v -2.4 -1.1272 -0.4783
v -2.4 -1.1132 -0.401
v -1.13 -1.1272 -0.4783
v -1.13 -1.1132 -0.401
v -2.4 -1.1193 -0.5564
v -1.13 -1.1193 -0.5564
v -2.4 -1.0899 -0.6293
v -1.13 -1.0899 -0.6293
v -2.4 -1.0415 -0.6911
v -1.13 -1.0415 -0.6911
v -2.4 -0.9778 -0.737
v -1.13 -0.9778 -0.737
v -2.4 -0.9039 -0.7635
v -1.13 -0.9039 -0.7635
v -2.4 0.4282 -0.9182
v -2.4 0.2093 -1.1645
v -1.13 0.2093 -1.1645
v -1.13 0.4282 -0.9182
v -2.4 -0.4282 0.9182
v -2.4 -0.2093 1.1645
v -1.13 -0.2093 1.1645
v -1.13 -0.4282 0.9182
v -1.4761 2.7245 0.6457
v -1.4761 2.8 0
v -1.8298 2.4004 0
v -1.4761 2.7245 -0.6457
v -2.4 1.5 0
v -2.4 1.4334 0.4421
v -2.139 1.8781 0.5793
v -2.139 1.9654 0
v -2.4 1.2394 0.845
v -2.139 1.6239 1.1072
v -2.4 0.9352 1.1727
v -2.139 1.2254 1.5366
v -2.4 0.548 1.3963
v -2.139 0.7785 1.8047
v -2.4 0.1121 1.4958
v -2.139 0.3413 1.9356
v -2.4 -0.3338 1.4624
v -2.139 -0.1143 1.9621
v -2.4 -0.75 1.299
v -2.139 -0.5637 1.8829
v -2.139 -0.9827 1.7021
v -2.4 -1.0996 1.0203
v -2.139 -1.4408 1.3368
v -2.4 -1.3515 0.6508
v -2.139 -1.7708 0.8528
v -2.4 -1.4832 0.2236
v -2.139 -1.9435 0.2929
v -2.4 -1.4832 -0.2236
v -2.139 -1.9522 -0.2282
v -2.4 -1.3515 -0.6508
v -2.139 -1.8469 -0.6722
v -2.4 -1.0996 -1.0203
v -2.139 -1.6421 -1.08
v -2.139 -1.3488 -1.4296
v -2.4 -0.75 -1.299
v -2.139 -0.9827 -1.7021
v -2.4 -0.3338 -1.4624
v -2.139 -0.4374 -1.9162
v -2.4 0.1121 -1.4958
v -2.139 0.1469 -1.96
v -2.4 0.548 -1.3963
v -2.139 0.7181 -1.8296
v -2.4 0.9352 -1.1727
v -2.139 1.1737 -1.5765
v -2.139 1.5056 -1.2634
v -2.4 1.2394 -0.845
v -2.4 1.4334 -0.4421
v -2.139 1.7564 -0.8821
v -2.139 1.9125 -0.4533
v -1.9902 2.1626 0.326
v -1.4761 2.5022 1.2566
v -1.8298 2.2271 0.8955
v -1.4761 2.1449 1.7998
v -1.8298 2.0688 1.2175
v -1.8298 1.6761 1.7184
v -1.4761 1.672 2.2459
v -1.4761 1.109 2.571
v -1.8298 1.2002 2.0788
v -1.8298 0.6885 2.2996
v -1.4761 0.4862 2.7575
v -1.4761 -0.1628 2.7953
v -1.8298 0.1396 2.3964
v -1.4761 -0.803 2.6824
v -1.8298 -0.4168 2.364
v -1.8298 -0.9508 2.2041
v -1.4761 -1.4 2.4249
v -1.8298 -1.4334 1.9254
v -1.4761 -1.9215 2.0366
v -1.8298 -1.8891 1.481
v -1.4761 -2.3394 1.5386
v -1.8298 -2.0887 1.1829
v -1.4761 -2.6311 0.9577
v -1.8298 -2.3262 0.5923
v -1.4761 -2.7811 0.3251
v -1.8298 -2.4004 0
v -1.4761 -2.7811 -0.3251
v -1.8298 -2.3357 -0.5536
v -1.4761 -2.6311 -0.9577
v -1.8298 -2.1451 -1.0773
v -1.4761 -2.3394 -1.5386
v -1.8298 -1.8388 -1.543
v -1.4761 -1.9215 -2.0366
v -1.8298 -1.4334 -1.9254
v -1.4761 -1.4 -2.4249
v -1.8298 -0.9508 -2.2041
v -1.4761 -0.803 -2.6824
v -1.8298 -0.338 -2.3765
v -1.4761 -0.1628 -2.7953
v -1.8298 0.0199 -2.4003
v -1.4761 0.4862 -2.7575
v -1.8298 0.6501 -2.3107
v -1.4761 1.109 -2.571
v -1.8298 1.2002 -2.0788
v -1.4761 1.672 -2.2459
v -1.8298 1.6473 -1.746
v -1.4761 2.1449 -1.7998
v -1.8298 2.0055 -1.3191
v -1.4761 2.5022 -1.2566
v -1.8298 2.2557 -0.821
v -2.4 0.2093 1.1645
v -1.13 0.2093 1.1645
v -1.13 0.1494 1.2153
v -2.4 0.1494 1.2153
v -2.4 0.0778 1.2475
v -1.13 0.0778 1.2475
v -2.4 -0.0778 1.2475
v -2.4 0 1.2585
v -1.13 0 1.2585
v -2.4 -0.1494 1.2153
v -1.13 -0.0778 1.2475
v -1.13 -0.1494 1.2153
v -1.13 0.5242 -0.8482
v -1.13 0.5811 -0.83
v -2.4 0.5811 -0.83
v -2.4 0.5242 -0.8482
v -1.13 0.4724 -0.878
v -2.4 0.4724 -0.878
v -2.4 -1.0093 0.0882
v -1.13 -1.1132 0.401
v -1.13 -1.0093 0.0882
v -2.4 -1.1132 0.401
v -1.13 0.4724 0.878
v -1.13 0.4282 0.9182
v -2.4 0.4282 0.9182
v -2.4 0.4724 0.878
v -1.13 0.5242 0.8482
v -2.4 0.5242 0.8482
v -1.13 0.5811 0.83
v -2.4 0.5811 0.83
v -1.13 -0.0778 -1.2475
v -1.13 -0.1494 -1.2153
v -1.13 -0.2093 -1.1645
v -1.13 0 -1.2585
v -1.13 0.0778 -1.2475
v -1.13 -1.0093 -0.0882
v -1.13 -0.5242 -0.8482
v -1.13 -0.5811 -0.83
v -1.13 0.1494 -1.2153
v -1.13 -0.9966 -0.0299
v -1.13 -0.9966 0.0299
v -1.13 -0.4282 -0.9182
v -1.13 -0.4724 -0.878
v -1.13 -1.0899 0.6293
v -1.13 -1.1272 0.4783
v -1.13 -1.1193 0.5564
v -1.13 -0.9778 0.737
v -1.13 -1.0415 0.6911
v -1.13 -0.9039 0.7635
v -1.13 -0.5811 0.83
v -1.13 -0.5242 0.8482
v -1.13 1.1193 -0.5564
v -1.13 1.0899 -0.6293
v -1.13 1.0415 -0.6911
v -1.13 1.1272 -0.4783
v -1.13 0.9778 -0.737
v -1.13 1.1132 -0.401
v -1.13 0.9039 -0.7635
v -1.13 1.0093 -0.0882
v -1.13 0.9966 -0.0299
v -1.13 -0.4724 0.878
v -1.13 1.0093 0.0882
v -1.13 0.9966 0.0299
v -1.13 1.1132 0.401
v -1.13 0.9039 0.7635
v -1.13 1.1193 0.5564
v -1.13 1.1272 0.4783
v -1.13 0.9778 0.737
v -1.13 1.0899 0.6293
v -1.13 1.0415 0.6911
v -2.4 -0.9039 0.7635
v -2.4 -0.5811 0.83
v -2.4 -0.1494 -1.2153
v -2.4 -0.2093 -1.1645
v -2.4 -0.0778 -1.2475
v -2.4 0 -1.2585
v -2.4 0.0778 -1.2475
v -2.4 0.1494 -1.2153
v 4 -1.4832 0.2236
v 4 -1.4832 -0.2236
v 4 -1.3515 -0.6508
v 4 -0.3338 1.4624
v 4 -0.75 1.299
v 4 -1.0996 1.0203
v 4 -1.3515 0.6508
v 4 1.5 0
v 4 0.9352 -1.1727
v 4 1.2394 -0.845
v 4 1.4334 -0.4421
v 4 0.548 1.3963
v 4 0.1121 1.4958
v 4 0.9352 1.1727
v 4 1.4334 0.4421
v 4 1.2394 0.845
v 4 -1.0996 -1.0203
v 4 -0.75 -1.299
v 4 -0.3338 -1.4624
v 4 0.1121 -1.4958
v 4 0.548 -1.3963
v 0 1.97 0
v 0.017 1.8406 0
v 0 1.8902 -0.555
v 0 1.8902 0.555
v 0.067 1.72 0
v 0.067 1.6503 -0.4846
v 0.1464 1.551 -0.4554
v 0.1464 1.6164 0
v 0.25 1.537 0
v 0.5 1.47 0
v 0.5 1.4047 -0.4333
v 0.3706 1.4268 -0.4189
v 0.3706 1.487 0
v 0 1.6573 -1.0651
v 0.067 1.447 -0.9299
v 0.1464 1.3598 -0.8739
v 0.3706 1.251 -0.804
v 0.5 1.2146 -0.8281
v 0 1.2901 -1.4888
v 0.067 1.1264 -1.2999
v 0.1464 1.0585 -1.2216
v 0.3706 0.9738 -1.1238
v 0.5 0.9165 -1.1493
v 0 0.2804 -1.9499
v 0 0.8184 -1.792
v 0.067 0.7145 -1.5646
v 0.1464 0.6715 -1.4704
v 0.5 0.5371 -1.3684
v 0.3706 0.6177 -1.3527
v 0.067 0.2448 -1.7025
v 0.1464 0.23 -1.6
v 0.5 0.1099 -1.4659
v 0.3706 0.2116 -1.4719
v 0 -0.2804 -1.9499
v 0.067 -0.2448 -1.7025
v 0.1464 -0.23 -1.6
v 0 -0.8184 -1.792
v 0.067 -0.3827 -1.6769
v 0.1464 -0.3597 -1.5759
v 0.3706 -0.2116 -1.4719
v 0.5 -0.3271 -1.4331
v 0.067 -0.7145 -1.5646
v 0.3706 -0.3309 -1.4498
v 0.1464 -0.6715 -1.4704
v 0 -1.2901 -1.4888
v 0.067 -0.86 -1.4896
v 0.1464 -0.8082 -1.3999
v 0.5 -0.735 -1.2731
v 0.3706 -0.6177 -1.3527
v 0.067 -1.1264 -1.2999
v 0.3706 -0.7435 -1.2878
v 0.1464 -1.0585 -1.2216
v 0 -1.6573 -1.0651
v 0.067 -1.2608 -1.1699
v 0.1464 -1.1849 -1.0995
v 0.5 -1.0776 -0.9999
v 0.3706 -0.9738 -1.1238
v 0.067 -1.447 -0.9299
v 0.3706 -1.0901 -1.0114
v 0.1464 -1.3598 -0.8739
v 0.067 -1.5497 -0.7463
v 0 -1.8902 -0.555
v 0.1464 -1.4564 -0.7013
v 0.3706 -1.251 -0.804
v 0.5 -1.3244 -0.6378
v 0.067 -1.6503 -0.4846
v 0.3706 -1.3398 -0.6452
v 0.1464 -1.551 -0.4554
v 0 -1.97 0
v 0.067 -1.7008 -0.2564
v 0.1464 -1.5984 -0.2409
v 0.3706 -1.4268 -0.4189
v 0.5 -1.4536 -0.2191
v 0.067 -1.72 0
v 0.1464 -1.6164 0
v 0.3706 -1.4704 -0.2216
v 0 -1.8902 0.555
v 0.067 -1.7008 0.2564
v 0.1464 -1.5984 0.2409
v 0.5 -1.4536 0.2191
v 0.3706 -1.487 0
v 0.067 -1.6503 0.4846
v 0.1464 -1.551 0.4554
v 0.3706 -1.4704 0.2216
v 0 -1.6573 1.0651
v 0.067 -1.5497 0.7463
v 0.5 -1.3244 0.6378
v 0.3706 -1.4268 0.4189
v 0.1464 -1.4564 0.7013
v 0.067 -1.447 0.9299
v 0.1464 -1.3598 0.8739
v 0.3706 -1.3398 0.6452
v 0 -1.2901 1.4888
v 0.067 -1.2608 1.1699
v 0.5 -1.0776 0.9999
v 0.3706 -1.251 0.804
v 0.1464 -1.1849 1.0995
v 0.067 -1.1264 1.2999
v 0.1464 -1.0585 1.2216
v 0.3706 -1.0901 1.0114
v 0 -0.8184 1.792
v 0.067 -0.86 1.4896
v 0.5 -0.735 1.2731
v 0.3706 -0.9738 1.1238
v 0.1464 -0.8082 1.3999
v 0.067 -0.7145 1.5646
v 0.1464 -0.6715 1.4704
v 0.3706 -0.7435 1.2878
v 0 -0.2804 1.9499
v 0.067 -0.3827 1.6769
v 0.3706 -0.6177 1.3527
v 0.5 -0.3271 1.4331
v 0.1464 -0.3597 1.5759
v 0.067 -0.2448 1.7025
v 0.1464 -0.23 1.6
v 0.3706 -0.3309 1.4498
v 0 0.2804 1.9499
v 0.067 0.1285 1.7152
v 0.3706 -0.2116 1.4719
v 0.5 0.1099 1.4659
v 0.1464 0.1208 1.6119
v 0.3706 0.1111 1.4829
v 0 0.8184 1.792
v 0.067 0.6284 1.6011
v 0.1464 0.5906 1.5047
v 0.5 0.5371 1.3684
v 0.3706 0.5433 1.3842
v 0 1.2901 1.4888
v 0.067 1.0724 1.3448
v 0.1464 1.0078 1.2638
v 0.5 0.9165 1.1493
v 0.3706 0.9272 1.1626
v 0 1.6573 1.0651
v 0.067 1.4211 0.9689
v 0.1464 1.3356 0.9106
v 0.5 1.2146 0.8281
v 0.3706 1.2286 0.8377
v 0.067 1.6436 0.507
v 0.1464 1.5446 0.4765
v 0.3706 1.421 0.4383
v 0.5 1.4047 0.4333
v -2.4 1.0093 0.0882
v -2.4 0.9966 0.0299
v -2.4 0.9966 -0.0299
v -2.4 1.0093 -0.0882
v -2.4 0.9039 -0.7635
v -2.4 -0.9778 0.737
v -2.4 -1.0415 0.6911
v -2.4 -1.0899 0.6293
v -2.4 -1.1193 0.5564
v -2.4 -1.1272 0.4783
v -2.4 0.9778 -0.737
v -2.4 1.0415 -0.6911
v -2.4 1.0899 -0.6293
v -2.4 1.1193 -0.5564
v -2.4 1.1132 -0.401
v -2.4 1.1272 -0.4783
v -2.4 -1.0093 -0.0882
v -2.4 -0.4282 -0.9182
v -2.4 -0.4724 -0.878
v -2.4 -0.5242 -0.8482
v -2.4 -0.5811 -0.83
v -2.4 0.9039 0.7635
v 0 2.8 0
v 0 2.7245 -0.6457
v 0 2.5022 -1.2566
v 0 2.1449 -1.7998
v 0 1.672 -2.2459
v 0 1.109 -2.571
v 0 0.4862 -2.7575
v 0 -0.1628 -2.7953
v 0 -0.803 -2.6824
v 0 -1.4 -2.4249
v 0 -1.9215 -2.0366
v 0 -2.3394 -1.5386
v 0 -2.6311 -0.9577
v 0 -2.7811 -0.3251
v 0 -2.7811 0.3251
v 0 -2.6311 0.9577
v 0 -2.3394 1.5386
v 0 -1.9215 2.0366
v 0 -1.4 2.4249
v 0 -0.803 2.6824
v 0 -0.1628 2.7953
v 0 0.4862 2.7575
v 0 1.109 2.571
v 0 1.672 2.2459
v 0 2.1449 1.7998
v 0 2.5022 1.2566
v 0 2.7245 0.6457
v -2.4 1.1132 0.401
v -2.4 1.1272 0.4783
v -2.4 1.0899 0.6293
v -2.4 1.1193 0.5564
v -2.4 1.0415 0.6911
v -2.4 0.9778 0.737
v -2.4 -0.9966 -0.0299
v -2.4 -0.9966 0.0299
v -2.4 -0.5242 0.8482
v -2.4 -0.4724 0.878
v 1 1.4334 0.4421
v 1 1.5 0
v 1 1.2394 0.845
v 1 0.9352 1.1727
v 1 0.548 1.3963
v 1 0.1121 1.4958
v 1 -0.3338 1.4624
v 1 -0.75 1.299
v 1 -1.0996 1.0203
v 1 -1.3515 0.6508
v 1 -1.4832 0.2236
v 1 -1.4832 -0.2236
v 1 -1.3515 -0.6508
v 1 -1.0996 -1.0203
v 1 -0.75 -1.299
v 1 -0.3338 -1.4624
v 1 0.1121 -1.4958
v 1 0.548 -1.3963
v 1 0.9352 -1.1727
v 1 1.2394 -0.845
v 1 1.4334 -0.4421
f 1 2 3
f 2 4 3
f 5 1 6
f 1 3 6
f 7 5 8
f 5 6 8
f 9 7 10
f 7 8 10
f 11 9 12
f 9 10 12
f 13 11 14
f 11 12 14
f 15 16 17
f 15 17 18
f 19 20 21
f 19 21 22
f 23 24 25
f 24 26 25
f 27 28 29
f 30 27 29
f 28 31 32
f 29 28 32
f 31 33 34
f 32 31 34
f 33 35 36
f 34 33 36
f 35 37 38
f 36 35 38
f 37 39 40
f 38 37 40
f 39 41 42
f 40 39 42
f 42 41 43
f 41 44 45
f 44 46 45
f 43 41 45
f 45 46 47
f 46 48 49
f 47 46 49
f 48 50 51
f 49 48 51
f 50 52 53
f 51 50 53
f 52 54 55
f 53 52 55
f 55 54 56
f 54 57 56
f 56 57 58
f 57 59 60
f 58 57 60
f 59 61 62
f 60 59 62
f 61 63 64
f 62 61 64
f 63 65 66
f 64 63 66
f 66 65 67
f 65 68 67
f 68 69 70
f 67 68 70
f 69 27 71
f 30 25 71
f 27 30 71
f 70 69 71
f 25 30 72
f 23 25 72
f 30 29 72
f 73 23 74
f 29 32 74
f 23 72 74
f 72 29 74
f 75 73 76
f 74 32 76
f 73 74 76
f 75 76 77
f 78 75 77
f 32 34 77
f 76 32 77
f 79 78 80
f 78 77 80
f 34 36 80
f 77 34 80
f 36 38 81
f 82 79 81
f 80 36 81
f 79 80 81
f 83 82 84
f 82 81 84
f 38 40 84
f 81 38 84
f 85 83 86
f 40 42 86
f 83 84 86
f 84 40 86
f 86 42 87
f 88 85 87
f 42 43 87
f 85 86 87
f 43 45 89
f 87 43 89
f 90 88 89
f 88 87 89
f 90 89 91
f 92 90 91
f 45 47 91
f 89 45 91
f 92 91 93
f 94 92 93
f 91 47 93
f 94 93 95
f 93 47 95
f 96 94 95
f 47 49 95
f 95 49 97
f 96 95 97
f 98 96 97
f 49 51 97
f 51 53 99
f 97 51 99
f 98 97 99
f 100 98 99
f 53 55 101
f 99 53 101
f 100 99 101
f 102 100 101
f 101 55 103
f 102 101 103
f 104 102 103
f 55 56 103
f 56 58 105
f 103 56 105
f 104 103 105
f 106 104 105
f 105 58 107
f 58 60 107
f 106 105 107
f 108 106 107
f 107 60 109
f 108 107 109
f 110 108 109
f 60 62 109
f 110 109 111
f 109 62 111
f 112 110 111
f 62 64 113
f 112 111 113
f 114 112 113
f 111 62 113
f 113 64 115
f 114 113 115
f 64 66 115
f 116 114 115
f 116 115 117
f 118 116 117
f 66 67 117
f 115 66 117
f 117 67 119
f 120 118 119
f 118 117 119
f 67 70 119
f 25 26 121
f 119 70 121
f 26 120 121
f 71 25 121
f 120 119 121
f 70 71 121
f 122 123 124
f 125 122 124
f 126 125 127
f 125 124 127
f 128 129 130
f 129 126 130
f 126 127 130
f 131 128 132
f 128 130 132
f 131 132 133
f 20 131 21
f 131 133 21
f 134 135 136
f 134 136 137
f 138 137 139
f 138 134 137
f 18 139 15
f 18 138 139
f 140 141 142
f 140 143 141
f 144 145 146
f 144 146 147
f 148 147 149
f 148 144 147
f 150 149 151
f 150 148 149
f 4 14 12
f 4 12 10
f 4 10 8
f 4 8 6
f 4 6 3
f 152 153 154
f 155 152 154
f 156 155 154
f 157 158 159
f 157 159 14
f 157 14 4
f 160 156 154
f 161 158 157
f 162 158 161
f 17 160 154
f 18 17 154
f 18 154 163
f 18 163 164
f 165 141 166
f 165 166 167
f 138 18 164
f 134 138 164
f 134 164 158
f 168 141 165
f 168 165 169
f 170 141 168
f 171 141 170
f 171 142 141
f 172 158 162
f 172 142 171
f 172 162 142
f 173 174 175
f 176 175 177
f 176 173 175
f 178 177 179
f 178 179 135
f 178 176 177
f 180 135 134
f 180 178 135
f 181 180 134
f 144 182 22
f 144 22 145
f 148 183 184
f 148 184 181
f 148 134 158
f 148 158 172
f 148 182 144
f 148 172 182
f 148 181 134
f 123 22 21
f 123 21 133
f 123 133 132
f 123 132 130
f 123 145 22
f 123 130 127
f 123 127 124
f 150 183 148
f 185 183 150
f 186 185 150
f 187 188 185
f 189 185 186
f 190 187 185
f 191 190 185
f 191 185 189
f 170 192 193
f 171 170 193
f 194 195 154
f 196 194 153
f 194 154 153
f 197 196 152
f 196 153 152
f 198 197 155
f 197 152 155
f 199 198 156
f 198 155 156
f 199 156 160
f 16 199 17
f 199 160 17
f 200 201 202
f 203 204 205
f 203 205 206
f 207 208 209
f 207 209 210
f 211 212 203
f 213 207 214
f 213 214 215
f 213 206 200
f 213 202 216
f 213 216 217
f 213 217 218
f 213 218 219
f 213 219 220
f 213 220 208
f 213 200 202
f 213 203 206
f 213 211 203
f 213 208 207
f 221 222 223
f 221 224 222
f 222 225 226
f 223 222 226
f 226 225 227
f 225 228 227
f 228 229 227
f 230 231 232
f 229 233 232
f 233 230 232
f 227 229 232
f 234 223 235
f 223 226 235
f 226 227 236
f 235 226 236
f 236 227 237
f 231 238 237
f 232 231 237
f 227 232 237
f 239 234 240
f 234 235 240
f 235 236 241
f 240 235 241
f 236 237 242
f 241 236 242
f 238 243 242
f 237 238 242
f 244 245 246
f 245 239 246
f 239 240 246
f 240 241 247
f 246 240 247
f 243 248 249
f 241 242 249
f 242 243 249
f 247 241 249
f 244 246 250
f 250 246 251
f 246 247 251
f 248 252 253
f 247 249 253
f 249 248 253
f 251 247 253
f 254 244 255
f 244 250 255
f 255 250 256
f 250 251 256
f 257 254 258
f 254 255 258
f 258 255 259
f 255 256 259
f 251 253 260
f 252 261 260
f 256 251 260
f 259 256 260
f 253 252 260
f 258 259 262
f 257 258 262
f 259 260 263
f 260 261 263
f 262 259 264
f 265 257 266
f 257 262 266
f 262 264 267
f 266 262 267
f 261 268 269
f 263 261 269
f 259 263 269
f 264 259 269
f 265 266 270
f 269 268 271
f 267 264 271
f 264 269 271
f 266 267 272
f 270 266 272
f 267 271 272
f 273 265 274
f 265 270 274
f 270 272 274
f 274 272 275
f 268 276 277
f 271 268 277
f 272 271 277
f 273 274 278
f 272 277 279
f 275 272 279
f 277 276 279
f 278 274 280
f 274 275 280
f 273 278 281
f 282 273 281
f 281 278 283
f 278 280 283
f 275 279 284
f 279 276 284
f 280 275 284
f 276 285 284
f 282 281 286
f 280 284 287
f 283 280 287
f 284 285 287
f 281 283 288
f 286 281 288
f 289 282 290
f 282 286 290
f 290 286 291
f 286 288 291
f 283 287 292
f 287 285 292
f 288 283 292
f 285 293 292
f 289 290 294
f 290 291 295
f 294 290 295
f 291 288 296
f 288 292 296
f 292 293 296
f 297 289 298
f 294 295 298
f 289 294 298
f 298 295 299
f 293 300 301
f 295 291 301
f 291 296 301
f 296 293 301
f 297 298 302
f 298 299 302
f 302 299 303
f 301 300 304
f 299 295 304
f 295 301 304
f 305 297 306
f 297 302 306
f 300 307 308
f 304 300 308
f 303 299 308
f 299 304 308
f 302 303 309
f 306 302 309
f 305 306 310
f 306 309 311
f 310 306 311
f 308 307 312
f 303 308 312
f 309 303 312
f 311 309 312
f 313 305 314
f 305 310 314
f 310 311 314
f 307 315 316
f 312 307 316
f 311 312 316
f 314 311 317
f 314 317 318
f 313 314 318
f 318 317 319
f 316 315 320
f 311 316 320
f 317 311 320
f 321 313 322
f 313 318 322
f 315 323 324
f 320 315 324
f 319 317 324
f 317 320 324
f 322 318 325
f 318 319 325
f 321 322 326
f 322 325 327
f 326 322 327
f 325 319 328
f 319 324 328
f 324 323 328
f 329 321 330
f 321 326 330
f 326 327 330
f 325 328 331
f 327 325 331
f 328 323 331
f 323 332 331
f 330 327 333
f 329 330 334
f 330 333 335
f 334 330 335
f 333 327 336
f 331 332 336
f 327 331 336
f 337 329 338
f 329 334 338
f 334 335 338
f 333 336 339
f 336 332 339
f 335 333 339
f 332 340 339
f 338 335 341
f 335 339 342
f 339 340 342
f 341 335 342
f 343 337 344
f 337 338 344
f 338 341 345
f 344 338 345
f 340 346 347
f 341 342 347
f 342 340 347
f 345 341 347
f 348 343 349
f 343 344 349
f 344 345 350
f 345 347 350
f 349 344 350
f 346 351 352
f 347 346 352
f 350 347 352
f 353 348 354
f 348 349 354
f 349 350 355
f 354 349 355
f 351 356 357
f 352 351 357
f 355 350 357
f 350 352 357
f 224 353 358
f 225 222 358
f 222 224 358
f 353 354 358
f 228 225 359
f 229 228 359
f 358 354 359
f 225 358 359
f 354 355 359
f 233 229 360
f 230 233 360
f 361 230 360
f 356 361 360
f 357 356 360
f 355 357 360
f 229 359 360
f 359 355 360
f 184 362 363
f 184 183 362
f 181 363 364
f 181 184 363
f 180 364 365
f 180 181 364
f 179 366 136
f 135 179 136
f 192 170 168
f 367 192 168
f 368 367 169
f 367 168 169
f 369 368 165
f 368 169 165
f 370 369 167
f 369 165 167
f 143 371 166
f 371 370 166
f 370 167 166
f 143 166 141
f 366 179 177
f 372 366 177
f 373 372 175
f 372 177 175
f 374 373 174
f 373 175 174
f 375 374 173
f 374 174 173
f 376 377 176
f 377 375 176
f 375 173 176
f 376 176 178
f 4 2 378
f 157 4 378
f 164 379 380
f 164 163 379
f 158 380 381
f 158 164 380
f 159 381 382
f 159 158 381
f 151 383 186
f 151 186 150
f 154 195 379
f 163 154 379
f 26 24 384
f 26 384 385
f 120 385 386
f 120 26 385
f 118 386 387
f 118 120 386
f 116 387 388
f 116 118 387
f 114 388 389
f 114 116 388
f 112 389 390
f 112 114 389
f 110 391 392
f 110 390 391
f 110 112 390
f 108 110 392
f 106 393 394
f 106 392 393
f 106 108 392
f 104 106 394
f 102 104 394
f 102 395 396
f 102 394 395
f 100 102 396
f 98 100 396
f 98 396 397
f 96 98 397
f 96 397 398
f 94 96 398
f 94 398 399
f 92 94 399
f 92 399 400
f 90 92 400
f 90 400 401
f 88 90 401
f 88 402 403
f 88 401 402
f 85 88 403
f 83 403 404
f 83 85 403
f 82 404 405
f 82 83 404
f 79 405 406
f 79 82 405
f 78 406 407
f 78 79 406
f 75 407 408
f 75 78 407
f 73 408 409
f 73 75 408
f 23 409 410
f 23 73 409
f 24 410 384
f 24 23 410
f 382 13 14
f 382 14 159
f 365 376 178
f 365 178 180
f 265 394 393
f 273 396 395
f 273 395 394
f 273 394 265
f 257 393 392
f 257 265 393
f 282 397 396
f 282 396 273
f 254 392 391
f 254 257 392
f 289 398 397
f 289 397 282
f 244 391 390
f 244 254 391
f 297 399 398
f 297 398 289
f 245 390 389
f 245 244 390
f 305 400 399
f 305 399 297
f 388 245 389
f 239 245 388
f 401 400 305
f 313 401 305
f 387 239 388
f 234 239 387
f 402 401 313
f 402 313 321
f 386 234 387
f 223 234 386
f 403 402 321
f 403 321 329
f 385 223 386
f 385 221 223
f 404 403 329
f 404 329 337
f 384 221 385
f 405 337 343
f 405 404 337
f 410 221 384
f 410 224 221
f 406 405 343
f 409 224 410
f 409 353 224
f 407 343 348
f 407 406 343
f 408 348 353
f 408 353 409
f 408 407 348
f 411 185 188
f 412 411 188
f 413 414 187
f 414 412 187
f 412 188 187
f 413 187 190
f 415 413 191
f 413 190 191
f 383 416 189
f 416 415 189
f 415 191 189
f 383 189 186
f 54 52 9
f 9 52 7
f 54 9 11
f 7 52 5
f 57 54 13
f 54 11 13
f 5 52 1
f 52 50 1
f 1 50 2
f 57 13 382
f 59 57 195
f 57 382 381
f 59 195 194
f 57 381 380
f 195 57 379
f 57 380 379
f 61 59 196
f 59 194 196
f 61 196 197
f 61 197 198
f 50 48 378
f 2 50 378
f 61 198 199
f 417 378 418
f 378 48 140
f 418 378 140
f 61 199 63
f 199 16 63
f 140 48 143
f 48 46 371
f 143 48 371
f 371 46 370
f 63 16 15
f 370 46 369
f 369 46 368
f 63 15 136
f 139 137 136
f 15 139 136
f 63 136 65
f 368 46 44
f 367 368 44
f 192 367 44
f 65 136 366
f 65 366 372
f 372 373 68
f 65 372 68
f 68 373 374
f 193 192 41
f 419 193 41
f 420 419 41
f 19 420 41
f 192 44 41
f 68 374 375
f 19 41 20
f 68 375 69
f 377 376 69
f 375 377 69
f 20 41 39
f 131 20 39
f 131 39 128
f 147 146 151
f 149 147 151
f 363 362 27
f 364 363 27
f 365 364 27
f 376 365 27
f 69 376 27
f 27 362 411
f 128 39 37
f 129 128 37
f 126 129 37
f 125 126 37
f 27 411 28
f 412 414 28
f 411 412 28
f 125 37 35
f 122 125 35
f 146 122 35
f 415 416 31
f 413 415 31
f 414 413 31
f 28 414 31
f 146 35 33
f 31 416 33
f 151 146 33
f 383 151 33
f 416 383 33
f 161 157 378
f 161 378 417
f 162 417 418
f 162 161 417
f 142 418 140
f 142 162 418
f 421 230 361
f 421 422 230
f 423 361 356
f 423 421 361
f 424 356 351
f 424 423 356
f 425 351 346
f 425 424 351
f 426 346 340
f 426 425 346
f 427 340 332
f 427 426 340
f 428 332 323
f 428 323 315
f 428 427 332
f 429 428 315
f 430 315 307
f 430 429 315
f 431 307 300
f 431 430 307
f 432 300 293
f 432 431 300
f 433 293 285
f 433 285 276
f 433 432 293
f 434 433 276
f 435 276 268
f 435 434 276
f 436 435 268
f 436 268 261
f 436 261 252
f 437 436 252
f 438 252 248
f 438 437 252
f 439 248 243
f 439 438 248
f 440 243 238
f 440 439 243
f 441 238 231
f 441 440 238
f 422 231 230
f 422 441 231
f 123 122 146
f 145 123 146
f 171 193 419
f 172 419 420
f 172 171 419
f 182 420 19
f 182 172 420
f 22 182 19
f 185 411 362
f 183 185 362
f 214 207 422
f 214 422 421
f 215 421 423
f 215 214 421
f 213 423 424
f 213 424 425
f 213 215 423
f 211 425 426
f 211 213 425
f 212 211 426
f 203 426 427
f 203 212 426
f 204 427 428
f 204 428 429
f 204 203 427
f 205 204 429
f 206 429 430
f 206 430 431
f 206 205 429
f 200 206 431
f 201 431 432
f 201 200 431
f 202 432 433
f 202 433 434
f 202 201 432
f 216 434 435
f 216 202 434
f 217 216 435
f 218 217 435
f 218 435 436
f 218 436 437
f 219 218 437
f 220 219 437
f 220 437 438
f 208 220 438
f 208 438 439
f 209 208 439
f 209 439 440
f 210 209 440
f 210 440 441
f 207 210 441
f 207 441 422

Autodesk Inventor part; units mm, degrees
ref_plane "YZ Plane" through (0, 0, 0) normal (1, 0, 0) x (0, 1, 0)
ref_plane "XZ Plane" through (0, 0, 0) normal (0, 1, 0) x (-1, 0, 0)
ref_plane "XY Plane" through (0, 0, 0) normal (0, 0, 1) x (1, 0, 0)
sketch "Sketch4" plane through (0, 0, 0) normal (0, 0, 1) x (1, 0, 0)
  line L0 (-2.4, 0) -> (4, 0)
  line L1 (0, 0) -> (-2.4, 0)
  line L2 (0, 2.8) -> (0, 1.97)
  line L3 (0.5, 1.47) -> (0.5, 1.47)
  line L4 (0.5, 1.47) -> (1, 1.5)
  arc A0 (0, 1.97) -> (0.5, 1.47) centre (0.5, 1.97) ccw
  line L5 (-2.4, 0) -> (-2.4, 1.5)
  line L6 (0, 2.8) -> (-1.4761, 2.8)
  arc A1 (-1.4761, 2.8) -> (-2.4, 1.5) centre (2.0854, -0.7093) ccw
  line L7 (1, 1.5) -> (4, 1.5)
  line L8 (4, 1.5) -> (4, 0)
  point P0 (0, 1.47)
  dimension "d71" = 0.5
  dimension "d72" = 4
  dimension "d74" = 0.5
  dimension "d75" = 2.94
  dimension "d78" = 3
  dimension "d82" = 5
  dimension "d83" = 2.4
  dimension "d84" = 5.6
  dimension "d104" = 3
  dimension "d105" = 3
revolve "Revolution7" add sketch "Sketch4" angle 360 about axis through (-2.4, 0, 0) along (1, 0, 0)
sketch "Sketch5" plane through (-2.4, 0, 0) normal (-1, 0, 0) x (0, 0, 1)
  circle A0 centre (0, 0) radius 1.4 construction
  circle A1 centre (0, 0) radius 0.98 construction
  line L0 (0, 0) -> (-0.8487, 0.49)
  line L1 (0, 0) -> (-0.8487, -0.49)
  line L2 (-1.8008, 0) -> (1.7887, 0)
  line L3 (-1.4, 0) -> (-0.8487, -0.49)
  line L4 (-1.4, 0) -> (-0.8487, 0.49)
  point P0 (0, 0)
  dimension "d88" = 2.8
  dimension "d89" = 1.96
  dimension "d90" = 30
  dimension "d91" = 30
extrude "Extrusion1" cut sketch "Sketch5" against normal blind 1.27
pattern_circular "Circular Pattern1" count 6 over 360 about axis through (-10, 0, 0) along (1, 0, 0) of "Extrusion1"
fillet "Fillet1" radius 0.28 12 edges at (-1.765, -1.2124, -0.7) (-1.765, -0.49, -0.8487) (-1.765, -0.98, 0) (-1.765, -1.2124, 0.7) (-1.765, -0.49, 0.8487) (-1.765, 0, 1.4) (-1.765, 0.98, 0) (-1.765, 1.2124, 0.7) (-1.765, 0.49, 0.8487) (-1.765, 0.49, -0.8487) (-1.765, 0, -1.4) (-1.765, 1.2124, -0.7)
thread "Thread7" size "M3x0.5" class "6g" standard "ISO Metric profile" length 3
properties part number "Šroub s válcovou hlavou a šestiramennou drážkou ISO 14583 - M3 x 4 - 4.8" material "Ocel"
